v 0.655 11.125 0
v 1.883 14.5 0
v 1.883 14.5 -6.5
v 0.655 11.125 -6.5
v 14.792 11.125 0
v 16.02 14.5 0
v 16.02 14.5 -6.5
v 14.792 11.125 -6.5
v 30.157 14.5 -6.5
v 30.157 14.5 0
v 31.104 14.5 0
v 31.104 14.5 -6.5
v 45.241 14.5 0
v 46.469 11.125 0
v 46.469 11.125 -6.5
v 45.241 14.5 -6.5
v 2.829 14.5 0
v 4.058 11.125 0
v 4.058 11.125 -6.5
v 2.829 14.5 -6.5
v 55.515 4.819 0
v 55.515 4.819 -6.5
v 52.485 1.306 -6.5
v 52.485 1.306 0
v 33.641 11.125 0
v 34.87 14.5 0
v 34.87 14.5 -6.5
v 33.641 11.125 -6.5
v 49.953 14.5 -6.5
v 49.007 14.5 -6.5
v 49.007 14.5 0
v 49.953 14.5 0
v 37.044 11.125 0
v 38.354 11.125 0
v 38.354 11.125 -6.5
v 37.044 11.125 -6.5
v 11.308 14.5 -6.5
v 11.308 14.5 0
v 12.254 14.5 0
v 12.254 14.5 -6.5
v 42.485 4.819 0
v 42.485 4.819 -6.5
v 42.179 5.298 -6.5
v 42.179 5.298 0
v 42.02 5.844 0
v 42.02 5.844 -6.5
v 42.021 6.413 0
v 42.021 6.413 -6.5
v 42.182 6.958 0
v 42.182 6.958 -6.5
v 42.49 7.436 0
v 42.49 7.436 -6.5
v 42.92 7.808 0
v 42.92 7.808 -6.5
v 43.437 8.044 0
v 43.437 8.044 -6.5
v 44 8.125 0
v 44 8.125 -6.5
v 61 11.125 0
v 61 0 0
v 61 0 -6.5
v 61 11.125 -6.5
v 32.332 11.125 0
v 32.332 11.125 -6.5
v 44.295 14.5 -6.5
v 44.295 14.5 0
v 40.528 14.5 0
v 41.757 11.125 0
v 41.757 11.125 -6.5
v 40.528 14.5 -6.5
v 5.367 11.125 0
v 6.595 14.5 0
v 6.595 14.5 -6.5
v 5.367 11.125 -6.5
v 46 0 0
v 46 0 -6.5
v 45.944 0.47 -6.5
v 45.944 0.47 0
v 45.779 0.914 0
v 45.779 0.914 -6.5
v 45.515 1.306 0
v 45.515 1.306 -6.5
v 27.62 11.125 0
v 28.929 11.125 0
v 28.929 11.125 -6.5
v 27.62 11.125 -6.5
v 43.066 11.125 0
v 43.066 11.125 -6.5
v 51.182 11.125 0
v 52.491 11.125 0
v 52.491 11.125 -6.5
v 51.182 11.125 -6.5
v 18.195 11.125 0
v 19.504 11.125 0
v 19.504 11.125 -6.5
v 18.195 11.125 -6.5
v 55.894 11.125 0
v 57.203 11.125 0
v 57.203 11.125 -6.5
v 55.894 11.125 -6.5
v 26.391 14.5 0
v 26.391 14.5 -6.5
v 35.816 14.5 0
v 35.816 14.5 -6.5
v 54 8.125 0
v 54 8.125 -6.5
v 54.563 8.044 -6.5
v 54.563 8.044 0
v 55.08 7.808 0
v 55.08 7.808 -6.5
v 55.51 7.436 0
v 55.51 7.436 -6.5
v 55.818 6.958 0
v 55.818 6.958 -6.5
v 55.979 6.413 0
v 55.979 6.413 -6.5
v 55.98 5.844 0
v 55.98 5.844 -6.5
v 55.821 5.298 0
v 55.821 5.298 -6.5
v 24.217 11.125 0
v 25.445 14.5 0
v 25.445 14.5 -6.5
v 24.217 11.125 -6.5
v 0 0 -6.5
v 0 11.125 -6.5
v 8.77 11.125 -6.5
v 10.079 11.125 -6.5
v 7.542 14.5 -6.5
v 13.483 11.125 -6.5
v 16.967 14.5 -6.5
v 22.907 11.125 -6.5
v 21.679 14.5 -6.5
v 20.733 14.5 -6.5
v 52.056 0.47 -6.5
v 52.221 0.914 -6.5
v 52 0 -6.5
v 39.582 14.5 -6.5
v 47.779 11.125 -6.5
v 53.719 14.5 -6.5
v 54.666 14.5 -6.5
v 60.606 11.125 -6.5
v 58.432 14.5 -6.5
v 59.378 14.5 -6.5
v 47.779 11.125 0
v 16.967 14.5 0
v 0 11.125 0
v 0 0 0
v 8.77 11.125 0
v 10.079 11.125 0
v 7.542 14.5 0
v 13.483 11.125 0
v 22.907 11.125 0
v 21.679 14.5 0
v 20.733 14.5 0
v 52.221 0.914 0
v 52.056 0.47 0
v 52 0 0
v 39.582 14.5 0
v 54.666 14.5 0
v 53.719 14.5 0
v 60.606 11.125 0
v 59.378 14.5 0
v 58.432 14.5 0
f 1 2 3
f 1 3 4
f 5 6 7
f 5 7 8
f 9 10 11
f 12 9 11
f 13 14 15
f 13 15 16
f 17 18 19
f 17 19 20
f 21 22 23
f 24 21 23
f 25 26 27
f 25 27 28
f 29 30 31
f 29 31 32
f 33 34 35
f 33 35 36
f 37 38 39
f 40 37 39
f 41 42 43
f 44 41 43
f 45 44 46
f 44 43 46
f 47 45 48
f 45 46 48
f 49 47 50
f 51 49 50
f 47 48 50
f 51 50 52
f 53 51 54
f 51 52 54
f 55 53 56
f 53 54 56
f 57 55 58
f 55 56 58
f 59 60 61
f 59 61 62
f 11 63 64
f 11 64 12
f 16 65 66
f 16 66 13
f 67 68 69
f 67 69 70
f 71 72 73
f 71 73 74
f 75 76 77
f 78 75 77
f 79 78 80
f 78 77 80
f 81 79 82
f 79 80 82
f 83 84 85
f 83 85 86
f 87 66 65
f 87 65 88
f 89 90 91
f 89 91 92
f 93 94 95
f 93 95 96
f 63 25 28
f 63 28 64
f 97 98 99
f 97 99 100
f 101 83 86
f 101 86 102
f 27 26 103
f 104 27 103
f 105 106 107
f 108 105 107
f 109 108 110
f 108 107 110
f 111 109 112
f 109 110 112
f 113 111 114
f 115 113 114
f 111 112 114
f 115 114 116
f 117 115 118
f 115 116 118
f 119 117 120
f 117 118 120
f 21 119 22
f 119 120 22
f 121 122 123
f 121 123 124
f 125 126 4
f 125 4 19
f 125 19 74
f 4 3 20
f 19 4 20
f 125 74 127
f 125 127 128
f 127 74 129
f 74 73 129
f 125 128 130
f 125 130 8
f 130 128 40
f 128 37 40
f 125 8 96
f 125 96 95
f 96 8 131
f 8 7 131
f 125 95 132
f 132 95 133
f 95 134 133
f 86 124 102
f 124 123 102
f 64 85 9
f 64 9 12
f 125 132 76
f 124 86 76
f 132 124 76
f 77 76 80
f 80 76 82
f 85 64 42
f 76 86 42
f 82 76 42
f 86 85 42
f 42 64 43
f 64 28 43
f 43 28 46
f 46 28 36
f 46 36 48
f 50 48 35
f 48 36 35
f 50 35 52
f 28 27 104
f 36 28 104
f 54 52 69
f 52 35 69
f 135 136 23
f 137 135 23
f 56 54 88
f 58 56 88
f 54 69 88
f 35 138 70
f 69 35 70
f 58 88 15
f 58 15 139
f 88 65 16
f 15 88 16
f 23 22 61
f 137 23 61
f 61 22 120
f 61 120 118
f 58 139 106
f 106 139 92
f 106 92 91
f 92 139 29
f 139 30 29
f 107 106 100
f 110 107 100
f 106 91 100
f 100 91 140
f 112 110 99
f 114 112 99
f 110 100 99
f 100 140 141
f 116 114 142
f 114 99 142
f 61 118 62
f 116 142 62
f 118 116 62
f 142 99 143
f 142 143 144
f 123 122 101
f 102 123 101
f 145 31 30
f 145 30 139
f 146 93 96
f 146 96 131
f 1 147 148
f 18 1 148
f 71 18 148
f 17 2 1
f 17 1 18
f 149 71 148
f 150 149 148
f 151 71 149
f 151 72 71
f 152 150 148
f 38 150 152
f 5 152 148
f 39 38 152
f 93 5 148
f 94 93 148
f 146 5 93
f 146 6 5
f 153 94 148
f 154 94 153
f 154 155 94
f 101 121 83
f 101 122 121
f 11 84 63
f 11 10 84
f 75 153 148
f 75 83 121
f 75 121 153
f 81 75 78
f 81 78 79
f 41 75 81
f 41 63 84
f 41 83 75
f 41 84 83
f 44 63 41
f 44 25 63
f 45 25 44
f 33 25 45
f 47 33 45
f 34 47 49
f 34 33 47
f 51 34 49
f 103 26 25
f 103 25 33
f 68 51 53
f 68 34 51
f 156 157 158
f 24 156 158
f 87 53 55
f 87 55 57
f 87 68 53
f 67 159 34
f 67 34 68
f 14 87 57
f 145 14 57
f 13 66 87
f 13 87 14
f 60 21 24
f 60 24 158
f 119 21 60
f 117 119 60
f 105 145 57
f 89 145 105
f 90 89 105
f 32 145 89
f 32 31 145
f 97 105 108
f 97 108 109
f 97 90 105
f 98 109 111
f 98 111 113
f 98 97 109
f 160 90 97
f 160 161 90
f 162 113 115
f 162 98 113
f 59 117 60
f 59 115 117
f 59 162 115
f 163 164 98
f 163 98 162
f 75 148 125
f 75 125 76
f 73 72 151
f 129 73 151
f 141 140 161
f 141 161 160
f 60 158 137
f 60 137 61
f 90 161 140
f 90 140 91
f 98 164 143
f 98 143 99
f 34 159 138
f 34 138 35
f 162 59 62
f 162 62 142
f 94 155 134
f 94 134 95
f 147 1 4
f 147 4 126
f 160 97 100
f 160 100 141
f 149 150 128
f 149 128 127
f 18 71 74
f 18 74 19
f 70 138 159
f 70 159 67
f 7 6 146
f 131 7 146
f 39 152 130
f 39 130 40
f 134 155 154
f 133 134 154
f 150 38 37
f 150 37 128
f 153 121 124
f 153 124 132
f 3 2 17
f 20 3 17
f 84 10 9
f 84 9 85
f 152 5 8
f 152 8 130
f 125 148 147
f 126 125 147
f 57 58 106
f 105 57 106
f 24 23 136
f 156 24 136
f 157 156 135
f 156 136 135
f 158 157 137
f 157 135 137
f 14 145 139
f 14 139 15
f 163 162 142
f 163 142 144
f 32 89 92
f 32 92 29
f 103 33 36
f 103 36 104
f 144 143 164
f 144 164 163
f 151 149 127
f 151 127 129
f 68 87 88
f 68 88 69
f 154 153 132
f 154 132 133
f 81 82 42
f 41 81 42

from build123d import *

# Parameters (mm, degrees)
BLANKSKE_W         = 61
BLANKSKE_H         = 14.5
BLANK_DEPTH        = 6.5
TOOTHCUTSIM_DEPTH  = 64.035704168
TEETHCUTS_COUNT    = 14
TEETHCUTS_PITCH    = 4.712388975
CUT_EXTRUDE1_DEPTH = 6.5


with BuildPart() as part:
    # BlankSke → Blank (new body)
    with BuildSketch(Plane.XY):
        with Locations((30.5, 7.25)):
            Rectangle(BLANKSKE_W, BLANKSKE_H)
    extrude(amount=-BLANK_DEPTH)

    # TooCutSkeSim → ToothCutSim (cut, through all)
    with BuildSketch(Plane.XY):
        Polygon((0.654653055, 11.125), (-0.654653055, 11.125), (-1.892297439, 14.5254), (1.892297439, 14.5254), align=None)
    toothcutsim = extrude(amount=-TOOTHCUTSIM_DEPTH, mode=Mode.SUBTRACT)

    # TeethCuts: ToothCutSim ×14
    with Locations(*[(i * TEETHCUTS_PITCH, 0, 0) for i in range(1, TEETHCUTS_COUNT)]):
        add(toothcutsim, mode=Mode.SUBTRACT)

    # Sketch1 → Cut-Extrude1 (cut)
    with BuildSketch(Plane(origin=(0, 0, -6.5), x_dir=(-1, 0, 0), z_dir=(0, 0, -1))):
        with BuildLine():
            Line((-44, 8.125), (-54, 8.125))
            ThreePointArc((-54, 8.125), (-55.81827458, 6.957993128), (-55.51461023, 4.818877551))
            Line((-55.51461023, 4.818877551), (-52.48538977, 1.306122449))
            ThreePointArc((-52.48538977, 1.306122449), (-52.125270625, 0.696699196), (-52, 0))
            Line((-52, 0), (-46, 0))
            ThreePointArc((-46, 0), (-45.874729375, 0.696699196), (-45.51461023, 1.306122449))
            Line((-45.51461023, 1.306122449), (-42.48538977, 4.818877551))
            ThreePointArc((-42.48538977, 4.818877551), (-42.18172542, 6.957993128), (-44, 8.125))
        make_face()
    extrude(amount=-CUT_EXTRUDE1_DEPTH, mode=Mode.SUBTRACT)


solid = part.part
